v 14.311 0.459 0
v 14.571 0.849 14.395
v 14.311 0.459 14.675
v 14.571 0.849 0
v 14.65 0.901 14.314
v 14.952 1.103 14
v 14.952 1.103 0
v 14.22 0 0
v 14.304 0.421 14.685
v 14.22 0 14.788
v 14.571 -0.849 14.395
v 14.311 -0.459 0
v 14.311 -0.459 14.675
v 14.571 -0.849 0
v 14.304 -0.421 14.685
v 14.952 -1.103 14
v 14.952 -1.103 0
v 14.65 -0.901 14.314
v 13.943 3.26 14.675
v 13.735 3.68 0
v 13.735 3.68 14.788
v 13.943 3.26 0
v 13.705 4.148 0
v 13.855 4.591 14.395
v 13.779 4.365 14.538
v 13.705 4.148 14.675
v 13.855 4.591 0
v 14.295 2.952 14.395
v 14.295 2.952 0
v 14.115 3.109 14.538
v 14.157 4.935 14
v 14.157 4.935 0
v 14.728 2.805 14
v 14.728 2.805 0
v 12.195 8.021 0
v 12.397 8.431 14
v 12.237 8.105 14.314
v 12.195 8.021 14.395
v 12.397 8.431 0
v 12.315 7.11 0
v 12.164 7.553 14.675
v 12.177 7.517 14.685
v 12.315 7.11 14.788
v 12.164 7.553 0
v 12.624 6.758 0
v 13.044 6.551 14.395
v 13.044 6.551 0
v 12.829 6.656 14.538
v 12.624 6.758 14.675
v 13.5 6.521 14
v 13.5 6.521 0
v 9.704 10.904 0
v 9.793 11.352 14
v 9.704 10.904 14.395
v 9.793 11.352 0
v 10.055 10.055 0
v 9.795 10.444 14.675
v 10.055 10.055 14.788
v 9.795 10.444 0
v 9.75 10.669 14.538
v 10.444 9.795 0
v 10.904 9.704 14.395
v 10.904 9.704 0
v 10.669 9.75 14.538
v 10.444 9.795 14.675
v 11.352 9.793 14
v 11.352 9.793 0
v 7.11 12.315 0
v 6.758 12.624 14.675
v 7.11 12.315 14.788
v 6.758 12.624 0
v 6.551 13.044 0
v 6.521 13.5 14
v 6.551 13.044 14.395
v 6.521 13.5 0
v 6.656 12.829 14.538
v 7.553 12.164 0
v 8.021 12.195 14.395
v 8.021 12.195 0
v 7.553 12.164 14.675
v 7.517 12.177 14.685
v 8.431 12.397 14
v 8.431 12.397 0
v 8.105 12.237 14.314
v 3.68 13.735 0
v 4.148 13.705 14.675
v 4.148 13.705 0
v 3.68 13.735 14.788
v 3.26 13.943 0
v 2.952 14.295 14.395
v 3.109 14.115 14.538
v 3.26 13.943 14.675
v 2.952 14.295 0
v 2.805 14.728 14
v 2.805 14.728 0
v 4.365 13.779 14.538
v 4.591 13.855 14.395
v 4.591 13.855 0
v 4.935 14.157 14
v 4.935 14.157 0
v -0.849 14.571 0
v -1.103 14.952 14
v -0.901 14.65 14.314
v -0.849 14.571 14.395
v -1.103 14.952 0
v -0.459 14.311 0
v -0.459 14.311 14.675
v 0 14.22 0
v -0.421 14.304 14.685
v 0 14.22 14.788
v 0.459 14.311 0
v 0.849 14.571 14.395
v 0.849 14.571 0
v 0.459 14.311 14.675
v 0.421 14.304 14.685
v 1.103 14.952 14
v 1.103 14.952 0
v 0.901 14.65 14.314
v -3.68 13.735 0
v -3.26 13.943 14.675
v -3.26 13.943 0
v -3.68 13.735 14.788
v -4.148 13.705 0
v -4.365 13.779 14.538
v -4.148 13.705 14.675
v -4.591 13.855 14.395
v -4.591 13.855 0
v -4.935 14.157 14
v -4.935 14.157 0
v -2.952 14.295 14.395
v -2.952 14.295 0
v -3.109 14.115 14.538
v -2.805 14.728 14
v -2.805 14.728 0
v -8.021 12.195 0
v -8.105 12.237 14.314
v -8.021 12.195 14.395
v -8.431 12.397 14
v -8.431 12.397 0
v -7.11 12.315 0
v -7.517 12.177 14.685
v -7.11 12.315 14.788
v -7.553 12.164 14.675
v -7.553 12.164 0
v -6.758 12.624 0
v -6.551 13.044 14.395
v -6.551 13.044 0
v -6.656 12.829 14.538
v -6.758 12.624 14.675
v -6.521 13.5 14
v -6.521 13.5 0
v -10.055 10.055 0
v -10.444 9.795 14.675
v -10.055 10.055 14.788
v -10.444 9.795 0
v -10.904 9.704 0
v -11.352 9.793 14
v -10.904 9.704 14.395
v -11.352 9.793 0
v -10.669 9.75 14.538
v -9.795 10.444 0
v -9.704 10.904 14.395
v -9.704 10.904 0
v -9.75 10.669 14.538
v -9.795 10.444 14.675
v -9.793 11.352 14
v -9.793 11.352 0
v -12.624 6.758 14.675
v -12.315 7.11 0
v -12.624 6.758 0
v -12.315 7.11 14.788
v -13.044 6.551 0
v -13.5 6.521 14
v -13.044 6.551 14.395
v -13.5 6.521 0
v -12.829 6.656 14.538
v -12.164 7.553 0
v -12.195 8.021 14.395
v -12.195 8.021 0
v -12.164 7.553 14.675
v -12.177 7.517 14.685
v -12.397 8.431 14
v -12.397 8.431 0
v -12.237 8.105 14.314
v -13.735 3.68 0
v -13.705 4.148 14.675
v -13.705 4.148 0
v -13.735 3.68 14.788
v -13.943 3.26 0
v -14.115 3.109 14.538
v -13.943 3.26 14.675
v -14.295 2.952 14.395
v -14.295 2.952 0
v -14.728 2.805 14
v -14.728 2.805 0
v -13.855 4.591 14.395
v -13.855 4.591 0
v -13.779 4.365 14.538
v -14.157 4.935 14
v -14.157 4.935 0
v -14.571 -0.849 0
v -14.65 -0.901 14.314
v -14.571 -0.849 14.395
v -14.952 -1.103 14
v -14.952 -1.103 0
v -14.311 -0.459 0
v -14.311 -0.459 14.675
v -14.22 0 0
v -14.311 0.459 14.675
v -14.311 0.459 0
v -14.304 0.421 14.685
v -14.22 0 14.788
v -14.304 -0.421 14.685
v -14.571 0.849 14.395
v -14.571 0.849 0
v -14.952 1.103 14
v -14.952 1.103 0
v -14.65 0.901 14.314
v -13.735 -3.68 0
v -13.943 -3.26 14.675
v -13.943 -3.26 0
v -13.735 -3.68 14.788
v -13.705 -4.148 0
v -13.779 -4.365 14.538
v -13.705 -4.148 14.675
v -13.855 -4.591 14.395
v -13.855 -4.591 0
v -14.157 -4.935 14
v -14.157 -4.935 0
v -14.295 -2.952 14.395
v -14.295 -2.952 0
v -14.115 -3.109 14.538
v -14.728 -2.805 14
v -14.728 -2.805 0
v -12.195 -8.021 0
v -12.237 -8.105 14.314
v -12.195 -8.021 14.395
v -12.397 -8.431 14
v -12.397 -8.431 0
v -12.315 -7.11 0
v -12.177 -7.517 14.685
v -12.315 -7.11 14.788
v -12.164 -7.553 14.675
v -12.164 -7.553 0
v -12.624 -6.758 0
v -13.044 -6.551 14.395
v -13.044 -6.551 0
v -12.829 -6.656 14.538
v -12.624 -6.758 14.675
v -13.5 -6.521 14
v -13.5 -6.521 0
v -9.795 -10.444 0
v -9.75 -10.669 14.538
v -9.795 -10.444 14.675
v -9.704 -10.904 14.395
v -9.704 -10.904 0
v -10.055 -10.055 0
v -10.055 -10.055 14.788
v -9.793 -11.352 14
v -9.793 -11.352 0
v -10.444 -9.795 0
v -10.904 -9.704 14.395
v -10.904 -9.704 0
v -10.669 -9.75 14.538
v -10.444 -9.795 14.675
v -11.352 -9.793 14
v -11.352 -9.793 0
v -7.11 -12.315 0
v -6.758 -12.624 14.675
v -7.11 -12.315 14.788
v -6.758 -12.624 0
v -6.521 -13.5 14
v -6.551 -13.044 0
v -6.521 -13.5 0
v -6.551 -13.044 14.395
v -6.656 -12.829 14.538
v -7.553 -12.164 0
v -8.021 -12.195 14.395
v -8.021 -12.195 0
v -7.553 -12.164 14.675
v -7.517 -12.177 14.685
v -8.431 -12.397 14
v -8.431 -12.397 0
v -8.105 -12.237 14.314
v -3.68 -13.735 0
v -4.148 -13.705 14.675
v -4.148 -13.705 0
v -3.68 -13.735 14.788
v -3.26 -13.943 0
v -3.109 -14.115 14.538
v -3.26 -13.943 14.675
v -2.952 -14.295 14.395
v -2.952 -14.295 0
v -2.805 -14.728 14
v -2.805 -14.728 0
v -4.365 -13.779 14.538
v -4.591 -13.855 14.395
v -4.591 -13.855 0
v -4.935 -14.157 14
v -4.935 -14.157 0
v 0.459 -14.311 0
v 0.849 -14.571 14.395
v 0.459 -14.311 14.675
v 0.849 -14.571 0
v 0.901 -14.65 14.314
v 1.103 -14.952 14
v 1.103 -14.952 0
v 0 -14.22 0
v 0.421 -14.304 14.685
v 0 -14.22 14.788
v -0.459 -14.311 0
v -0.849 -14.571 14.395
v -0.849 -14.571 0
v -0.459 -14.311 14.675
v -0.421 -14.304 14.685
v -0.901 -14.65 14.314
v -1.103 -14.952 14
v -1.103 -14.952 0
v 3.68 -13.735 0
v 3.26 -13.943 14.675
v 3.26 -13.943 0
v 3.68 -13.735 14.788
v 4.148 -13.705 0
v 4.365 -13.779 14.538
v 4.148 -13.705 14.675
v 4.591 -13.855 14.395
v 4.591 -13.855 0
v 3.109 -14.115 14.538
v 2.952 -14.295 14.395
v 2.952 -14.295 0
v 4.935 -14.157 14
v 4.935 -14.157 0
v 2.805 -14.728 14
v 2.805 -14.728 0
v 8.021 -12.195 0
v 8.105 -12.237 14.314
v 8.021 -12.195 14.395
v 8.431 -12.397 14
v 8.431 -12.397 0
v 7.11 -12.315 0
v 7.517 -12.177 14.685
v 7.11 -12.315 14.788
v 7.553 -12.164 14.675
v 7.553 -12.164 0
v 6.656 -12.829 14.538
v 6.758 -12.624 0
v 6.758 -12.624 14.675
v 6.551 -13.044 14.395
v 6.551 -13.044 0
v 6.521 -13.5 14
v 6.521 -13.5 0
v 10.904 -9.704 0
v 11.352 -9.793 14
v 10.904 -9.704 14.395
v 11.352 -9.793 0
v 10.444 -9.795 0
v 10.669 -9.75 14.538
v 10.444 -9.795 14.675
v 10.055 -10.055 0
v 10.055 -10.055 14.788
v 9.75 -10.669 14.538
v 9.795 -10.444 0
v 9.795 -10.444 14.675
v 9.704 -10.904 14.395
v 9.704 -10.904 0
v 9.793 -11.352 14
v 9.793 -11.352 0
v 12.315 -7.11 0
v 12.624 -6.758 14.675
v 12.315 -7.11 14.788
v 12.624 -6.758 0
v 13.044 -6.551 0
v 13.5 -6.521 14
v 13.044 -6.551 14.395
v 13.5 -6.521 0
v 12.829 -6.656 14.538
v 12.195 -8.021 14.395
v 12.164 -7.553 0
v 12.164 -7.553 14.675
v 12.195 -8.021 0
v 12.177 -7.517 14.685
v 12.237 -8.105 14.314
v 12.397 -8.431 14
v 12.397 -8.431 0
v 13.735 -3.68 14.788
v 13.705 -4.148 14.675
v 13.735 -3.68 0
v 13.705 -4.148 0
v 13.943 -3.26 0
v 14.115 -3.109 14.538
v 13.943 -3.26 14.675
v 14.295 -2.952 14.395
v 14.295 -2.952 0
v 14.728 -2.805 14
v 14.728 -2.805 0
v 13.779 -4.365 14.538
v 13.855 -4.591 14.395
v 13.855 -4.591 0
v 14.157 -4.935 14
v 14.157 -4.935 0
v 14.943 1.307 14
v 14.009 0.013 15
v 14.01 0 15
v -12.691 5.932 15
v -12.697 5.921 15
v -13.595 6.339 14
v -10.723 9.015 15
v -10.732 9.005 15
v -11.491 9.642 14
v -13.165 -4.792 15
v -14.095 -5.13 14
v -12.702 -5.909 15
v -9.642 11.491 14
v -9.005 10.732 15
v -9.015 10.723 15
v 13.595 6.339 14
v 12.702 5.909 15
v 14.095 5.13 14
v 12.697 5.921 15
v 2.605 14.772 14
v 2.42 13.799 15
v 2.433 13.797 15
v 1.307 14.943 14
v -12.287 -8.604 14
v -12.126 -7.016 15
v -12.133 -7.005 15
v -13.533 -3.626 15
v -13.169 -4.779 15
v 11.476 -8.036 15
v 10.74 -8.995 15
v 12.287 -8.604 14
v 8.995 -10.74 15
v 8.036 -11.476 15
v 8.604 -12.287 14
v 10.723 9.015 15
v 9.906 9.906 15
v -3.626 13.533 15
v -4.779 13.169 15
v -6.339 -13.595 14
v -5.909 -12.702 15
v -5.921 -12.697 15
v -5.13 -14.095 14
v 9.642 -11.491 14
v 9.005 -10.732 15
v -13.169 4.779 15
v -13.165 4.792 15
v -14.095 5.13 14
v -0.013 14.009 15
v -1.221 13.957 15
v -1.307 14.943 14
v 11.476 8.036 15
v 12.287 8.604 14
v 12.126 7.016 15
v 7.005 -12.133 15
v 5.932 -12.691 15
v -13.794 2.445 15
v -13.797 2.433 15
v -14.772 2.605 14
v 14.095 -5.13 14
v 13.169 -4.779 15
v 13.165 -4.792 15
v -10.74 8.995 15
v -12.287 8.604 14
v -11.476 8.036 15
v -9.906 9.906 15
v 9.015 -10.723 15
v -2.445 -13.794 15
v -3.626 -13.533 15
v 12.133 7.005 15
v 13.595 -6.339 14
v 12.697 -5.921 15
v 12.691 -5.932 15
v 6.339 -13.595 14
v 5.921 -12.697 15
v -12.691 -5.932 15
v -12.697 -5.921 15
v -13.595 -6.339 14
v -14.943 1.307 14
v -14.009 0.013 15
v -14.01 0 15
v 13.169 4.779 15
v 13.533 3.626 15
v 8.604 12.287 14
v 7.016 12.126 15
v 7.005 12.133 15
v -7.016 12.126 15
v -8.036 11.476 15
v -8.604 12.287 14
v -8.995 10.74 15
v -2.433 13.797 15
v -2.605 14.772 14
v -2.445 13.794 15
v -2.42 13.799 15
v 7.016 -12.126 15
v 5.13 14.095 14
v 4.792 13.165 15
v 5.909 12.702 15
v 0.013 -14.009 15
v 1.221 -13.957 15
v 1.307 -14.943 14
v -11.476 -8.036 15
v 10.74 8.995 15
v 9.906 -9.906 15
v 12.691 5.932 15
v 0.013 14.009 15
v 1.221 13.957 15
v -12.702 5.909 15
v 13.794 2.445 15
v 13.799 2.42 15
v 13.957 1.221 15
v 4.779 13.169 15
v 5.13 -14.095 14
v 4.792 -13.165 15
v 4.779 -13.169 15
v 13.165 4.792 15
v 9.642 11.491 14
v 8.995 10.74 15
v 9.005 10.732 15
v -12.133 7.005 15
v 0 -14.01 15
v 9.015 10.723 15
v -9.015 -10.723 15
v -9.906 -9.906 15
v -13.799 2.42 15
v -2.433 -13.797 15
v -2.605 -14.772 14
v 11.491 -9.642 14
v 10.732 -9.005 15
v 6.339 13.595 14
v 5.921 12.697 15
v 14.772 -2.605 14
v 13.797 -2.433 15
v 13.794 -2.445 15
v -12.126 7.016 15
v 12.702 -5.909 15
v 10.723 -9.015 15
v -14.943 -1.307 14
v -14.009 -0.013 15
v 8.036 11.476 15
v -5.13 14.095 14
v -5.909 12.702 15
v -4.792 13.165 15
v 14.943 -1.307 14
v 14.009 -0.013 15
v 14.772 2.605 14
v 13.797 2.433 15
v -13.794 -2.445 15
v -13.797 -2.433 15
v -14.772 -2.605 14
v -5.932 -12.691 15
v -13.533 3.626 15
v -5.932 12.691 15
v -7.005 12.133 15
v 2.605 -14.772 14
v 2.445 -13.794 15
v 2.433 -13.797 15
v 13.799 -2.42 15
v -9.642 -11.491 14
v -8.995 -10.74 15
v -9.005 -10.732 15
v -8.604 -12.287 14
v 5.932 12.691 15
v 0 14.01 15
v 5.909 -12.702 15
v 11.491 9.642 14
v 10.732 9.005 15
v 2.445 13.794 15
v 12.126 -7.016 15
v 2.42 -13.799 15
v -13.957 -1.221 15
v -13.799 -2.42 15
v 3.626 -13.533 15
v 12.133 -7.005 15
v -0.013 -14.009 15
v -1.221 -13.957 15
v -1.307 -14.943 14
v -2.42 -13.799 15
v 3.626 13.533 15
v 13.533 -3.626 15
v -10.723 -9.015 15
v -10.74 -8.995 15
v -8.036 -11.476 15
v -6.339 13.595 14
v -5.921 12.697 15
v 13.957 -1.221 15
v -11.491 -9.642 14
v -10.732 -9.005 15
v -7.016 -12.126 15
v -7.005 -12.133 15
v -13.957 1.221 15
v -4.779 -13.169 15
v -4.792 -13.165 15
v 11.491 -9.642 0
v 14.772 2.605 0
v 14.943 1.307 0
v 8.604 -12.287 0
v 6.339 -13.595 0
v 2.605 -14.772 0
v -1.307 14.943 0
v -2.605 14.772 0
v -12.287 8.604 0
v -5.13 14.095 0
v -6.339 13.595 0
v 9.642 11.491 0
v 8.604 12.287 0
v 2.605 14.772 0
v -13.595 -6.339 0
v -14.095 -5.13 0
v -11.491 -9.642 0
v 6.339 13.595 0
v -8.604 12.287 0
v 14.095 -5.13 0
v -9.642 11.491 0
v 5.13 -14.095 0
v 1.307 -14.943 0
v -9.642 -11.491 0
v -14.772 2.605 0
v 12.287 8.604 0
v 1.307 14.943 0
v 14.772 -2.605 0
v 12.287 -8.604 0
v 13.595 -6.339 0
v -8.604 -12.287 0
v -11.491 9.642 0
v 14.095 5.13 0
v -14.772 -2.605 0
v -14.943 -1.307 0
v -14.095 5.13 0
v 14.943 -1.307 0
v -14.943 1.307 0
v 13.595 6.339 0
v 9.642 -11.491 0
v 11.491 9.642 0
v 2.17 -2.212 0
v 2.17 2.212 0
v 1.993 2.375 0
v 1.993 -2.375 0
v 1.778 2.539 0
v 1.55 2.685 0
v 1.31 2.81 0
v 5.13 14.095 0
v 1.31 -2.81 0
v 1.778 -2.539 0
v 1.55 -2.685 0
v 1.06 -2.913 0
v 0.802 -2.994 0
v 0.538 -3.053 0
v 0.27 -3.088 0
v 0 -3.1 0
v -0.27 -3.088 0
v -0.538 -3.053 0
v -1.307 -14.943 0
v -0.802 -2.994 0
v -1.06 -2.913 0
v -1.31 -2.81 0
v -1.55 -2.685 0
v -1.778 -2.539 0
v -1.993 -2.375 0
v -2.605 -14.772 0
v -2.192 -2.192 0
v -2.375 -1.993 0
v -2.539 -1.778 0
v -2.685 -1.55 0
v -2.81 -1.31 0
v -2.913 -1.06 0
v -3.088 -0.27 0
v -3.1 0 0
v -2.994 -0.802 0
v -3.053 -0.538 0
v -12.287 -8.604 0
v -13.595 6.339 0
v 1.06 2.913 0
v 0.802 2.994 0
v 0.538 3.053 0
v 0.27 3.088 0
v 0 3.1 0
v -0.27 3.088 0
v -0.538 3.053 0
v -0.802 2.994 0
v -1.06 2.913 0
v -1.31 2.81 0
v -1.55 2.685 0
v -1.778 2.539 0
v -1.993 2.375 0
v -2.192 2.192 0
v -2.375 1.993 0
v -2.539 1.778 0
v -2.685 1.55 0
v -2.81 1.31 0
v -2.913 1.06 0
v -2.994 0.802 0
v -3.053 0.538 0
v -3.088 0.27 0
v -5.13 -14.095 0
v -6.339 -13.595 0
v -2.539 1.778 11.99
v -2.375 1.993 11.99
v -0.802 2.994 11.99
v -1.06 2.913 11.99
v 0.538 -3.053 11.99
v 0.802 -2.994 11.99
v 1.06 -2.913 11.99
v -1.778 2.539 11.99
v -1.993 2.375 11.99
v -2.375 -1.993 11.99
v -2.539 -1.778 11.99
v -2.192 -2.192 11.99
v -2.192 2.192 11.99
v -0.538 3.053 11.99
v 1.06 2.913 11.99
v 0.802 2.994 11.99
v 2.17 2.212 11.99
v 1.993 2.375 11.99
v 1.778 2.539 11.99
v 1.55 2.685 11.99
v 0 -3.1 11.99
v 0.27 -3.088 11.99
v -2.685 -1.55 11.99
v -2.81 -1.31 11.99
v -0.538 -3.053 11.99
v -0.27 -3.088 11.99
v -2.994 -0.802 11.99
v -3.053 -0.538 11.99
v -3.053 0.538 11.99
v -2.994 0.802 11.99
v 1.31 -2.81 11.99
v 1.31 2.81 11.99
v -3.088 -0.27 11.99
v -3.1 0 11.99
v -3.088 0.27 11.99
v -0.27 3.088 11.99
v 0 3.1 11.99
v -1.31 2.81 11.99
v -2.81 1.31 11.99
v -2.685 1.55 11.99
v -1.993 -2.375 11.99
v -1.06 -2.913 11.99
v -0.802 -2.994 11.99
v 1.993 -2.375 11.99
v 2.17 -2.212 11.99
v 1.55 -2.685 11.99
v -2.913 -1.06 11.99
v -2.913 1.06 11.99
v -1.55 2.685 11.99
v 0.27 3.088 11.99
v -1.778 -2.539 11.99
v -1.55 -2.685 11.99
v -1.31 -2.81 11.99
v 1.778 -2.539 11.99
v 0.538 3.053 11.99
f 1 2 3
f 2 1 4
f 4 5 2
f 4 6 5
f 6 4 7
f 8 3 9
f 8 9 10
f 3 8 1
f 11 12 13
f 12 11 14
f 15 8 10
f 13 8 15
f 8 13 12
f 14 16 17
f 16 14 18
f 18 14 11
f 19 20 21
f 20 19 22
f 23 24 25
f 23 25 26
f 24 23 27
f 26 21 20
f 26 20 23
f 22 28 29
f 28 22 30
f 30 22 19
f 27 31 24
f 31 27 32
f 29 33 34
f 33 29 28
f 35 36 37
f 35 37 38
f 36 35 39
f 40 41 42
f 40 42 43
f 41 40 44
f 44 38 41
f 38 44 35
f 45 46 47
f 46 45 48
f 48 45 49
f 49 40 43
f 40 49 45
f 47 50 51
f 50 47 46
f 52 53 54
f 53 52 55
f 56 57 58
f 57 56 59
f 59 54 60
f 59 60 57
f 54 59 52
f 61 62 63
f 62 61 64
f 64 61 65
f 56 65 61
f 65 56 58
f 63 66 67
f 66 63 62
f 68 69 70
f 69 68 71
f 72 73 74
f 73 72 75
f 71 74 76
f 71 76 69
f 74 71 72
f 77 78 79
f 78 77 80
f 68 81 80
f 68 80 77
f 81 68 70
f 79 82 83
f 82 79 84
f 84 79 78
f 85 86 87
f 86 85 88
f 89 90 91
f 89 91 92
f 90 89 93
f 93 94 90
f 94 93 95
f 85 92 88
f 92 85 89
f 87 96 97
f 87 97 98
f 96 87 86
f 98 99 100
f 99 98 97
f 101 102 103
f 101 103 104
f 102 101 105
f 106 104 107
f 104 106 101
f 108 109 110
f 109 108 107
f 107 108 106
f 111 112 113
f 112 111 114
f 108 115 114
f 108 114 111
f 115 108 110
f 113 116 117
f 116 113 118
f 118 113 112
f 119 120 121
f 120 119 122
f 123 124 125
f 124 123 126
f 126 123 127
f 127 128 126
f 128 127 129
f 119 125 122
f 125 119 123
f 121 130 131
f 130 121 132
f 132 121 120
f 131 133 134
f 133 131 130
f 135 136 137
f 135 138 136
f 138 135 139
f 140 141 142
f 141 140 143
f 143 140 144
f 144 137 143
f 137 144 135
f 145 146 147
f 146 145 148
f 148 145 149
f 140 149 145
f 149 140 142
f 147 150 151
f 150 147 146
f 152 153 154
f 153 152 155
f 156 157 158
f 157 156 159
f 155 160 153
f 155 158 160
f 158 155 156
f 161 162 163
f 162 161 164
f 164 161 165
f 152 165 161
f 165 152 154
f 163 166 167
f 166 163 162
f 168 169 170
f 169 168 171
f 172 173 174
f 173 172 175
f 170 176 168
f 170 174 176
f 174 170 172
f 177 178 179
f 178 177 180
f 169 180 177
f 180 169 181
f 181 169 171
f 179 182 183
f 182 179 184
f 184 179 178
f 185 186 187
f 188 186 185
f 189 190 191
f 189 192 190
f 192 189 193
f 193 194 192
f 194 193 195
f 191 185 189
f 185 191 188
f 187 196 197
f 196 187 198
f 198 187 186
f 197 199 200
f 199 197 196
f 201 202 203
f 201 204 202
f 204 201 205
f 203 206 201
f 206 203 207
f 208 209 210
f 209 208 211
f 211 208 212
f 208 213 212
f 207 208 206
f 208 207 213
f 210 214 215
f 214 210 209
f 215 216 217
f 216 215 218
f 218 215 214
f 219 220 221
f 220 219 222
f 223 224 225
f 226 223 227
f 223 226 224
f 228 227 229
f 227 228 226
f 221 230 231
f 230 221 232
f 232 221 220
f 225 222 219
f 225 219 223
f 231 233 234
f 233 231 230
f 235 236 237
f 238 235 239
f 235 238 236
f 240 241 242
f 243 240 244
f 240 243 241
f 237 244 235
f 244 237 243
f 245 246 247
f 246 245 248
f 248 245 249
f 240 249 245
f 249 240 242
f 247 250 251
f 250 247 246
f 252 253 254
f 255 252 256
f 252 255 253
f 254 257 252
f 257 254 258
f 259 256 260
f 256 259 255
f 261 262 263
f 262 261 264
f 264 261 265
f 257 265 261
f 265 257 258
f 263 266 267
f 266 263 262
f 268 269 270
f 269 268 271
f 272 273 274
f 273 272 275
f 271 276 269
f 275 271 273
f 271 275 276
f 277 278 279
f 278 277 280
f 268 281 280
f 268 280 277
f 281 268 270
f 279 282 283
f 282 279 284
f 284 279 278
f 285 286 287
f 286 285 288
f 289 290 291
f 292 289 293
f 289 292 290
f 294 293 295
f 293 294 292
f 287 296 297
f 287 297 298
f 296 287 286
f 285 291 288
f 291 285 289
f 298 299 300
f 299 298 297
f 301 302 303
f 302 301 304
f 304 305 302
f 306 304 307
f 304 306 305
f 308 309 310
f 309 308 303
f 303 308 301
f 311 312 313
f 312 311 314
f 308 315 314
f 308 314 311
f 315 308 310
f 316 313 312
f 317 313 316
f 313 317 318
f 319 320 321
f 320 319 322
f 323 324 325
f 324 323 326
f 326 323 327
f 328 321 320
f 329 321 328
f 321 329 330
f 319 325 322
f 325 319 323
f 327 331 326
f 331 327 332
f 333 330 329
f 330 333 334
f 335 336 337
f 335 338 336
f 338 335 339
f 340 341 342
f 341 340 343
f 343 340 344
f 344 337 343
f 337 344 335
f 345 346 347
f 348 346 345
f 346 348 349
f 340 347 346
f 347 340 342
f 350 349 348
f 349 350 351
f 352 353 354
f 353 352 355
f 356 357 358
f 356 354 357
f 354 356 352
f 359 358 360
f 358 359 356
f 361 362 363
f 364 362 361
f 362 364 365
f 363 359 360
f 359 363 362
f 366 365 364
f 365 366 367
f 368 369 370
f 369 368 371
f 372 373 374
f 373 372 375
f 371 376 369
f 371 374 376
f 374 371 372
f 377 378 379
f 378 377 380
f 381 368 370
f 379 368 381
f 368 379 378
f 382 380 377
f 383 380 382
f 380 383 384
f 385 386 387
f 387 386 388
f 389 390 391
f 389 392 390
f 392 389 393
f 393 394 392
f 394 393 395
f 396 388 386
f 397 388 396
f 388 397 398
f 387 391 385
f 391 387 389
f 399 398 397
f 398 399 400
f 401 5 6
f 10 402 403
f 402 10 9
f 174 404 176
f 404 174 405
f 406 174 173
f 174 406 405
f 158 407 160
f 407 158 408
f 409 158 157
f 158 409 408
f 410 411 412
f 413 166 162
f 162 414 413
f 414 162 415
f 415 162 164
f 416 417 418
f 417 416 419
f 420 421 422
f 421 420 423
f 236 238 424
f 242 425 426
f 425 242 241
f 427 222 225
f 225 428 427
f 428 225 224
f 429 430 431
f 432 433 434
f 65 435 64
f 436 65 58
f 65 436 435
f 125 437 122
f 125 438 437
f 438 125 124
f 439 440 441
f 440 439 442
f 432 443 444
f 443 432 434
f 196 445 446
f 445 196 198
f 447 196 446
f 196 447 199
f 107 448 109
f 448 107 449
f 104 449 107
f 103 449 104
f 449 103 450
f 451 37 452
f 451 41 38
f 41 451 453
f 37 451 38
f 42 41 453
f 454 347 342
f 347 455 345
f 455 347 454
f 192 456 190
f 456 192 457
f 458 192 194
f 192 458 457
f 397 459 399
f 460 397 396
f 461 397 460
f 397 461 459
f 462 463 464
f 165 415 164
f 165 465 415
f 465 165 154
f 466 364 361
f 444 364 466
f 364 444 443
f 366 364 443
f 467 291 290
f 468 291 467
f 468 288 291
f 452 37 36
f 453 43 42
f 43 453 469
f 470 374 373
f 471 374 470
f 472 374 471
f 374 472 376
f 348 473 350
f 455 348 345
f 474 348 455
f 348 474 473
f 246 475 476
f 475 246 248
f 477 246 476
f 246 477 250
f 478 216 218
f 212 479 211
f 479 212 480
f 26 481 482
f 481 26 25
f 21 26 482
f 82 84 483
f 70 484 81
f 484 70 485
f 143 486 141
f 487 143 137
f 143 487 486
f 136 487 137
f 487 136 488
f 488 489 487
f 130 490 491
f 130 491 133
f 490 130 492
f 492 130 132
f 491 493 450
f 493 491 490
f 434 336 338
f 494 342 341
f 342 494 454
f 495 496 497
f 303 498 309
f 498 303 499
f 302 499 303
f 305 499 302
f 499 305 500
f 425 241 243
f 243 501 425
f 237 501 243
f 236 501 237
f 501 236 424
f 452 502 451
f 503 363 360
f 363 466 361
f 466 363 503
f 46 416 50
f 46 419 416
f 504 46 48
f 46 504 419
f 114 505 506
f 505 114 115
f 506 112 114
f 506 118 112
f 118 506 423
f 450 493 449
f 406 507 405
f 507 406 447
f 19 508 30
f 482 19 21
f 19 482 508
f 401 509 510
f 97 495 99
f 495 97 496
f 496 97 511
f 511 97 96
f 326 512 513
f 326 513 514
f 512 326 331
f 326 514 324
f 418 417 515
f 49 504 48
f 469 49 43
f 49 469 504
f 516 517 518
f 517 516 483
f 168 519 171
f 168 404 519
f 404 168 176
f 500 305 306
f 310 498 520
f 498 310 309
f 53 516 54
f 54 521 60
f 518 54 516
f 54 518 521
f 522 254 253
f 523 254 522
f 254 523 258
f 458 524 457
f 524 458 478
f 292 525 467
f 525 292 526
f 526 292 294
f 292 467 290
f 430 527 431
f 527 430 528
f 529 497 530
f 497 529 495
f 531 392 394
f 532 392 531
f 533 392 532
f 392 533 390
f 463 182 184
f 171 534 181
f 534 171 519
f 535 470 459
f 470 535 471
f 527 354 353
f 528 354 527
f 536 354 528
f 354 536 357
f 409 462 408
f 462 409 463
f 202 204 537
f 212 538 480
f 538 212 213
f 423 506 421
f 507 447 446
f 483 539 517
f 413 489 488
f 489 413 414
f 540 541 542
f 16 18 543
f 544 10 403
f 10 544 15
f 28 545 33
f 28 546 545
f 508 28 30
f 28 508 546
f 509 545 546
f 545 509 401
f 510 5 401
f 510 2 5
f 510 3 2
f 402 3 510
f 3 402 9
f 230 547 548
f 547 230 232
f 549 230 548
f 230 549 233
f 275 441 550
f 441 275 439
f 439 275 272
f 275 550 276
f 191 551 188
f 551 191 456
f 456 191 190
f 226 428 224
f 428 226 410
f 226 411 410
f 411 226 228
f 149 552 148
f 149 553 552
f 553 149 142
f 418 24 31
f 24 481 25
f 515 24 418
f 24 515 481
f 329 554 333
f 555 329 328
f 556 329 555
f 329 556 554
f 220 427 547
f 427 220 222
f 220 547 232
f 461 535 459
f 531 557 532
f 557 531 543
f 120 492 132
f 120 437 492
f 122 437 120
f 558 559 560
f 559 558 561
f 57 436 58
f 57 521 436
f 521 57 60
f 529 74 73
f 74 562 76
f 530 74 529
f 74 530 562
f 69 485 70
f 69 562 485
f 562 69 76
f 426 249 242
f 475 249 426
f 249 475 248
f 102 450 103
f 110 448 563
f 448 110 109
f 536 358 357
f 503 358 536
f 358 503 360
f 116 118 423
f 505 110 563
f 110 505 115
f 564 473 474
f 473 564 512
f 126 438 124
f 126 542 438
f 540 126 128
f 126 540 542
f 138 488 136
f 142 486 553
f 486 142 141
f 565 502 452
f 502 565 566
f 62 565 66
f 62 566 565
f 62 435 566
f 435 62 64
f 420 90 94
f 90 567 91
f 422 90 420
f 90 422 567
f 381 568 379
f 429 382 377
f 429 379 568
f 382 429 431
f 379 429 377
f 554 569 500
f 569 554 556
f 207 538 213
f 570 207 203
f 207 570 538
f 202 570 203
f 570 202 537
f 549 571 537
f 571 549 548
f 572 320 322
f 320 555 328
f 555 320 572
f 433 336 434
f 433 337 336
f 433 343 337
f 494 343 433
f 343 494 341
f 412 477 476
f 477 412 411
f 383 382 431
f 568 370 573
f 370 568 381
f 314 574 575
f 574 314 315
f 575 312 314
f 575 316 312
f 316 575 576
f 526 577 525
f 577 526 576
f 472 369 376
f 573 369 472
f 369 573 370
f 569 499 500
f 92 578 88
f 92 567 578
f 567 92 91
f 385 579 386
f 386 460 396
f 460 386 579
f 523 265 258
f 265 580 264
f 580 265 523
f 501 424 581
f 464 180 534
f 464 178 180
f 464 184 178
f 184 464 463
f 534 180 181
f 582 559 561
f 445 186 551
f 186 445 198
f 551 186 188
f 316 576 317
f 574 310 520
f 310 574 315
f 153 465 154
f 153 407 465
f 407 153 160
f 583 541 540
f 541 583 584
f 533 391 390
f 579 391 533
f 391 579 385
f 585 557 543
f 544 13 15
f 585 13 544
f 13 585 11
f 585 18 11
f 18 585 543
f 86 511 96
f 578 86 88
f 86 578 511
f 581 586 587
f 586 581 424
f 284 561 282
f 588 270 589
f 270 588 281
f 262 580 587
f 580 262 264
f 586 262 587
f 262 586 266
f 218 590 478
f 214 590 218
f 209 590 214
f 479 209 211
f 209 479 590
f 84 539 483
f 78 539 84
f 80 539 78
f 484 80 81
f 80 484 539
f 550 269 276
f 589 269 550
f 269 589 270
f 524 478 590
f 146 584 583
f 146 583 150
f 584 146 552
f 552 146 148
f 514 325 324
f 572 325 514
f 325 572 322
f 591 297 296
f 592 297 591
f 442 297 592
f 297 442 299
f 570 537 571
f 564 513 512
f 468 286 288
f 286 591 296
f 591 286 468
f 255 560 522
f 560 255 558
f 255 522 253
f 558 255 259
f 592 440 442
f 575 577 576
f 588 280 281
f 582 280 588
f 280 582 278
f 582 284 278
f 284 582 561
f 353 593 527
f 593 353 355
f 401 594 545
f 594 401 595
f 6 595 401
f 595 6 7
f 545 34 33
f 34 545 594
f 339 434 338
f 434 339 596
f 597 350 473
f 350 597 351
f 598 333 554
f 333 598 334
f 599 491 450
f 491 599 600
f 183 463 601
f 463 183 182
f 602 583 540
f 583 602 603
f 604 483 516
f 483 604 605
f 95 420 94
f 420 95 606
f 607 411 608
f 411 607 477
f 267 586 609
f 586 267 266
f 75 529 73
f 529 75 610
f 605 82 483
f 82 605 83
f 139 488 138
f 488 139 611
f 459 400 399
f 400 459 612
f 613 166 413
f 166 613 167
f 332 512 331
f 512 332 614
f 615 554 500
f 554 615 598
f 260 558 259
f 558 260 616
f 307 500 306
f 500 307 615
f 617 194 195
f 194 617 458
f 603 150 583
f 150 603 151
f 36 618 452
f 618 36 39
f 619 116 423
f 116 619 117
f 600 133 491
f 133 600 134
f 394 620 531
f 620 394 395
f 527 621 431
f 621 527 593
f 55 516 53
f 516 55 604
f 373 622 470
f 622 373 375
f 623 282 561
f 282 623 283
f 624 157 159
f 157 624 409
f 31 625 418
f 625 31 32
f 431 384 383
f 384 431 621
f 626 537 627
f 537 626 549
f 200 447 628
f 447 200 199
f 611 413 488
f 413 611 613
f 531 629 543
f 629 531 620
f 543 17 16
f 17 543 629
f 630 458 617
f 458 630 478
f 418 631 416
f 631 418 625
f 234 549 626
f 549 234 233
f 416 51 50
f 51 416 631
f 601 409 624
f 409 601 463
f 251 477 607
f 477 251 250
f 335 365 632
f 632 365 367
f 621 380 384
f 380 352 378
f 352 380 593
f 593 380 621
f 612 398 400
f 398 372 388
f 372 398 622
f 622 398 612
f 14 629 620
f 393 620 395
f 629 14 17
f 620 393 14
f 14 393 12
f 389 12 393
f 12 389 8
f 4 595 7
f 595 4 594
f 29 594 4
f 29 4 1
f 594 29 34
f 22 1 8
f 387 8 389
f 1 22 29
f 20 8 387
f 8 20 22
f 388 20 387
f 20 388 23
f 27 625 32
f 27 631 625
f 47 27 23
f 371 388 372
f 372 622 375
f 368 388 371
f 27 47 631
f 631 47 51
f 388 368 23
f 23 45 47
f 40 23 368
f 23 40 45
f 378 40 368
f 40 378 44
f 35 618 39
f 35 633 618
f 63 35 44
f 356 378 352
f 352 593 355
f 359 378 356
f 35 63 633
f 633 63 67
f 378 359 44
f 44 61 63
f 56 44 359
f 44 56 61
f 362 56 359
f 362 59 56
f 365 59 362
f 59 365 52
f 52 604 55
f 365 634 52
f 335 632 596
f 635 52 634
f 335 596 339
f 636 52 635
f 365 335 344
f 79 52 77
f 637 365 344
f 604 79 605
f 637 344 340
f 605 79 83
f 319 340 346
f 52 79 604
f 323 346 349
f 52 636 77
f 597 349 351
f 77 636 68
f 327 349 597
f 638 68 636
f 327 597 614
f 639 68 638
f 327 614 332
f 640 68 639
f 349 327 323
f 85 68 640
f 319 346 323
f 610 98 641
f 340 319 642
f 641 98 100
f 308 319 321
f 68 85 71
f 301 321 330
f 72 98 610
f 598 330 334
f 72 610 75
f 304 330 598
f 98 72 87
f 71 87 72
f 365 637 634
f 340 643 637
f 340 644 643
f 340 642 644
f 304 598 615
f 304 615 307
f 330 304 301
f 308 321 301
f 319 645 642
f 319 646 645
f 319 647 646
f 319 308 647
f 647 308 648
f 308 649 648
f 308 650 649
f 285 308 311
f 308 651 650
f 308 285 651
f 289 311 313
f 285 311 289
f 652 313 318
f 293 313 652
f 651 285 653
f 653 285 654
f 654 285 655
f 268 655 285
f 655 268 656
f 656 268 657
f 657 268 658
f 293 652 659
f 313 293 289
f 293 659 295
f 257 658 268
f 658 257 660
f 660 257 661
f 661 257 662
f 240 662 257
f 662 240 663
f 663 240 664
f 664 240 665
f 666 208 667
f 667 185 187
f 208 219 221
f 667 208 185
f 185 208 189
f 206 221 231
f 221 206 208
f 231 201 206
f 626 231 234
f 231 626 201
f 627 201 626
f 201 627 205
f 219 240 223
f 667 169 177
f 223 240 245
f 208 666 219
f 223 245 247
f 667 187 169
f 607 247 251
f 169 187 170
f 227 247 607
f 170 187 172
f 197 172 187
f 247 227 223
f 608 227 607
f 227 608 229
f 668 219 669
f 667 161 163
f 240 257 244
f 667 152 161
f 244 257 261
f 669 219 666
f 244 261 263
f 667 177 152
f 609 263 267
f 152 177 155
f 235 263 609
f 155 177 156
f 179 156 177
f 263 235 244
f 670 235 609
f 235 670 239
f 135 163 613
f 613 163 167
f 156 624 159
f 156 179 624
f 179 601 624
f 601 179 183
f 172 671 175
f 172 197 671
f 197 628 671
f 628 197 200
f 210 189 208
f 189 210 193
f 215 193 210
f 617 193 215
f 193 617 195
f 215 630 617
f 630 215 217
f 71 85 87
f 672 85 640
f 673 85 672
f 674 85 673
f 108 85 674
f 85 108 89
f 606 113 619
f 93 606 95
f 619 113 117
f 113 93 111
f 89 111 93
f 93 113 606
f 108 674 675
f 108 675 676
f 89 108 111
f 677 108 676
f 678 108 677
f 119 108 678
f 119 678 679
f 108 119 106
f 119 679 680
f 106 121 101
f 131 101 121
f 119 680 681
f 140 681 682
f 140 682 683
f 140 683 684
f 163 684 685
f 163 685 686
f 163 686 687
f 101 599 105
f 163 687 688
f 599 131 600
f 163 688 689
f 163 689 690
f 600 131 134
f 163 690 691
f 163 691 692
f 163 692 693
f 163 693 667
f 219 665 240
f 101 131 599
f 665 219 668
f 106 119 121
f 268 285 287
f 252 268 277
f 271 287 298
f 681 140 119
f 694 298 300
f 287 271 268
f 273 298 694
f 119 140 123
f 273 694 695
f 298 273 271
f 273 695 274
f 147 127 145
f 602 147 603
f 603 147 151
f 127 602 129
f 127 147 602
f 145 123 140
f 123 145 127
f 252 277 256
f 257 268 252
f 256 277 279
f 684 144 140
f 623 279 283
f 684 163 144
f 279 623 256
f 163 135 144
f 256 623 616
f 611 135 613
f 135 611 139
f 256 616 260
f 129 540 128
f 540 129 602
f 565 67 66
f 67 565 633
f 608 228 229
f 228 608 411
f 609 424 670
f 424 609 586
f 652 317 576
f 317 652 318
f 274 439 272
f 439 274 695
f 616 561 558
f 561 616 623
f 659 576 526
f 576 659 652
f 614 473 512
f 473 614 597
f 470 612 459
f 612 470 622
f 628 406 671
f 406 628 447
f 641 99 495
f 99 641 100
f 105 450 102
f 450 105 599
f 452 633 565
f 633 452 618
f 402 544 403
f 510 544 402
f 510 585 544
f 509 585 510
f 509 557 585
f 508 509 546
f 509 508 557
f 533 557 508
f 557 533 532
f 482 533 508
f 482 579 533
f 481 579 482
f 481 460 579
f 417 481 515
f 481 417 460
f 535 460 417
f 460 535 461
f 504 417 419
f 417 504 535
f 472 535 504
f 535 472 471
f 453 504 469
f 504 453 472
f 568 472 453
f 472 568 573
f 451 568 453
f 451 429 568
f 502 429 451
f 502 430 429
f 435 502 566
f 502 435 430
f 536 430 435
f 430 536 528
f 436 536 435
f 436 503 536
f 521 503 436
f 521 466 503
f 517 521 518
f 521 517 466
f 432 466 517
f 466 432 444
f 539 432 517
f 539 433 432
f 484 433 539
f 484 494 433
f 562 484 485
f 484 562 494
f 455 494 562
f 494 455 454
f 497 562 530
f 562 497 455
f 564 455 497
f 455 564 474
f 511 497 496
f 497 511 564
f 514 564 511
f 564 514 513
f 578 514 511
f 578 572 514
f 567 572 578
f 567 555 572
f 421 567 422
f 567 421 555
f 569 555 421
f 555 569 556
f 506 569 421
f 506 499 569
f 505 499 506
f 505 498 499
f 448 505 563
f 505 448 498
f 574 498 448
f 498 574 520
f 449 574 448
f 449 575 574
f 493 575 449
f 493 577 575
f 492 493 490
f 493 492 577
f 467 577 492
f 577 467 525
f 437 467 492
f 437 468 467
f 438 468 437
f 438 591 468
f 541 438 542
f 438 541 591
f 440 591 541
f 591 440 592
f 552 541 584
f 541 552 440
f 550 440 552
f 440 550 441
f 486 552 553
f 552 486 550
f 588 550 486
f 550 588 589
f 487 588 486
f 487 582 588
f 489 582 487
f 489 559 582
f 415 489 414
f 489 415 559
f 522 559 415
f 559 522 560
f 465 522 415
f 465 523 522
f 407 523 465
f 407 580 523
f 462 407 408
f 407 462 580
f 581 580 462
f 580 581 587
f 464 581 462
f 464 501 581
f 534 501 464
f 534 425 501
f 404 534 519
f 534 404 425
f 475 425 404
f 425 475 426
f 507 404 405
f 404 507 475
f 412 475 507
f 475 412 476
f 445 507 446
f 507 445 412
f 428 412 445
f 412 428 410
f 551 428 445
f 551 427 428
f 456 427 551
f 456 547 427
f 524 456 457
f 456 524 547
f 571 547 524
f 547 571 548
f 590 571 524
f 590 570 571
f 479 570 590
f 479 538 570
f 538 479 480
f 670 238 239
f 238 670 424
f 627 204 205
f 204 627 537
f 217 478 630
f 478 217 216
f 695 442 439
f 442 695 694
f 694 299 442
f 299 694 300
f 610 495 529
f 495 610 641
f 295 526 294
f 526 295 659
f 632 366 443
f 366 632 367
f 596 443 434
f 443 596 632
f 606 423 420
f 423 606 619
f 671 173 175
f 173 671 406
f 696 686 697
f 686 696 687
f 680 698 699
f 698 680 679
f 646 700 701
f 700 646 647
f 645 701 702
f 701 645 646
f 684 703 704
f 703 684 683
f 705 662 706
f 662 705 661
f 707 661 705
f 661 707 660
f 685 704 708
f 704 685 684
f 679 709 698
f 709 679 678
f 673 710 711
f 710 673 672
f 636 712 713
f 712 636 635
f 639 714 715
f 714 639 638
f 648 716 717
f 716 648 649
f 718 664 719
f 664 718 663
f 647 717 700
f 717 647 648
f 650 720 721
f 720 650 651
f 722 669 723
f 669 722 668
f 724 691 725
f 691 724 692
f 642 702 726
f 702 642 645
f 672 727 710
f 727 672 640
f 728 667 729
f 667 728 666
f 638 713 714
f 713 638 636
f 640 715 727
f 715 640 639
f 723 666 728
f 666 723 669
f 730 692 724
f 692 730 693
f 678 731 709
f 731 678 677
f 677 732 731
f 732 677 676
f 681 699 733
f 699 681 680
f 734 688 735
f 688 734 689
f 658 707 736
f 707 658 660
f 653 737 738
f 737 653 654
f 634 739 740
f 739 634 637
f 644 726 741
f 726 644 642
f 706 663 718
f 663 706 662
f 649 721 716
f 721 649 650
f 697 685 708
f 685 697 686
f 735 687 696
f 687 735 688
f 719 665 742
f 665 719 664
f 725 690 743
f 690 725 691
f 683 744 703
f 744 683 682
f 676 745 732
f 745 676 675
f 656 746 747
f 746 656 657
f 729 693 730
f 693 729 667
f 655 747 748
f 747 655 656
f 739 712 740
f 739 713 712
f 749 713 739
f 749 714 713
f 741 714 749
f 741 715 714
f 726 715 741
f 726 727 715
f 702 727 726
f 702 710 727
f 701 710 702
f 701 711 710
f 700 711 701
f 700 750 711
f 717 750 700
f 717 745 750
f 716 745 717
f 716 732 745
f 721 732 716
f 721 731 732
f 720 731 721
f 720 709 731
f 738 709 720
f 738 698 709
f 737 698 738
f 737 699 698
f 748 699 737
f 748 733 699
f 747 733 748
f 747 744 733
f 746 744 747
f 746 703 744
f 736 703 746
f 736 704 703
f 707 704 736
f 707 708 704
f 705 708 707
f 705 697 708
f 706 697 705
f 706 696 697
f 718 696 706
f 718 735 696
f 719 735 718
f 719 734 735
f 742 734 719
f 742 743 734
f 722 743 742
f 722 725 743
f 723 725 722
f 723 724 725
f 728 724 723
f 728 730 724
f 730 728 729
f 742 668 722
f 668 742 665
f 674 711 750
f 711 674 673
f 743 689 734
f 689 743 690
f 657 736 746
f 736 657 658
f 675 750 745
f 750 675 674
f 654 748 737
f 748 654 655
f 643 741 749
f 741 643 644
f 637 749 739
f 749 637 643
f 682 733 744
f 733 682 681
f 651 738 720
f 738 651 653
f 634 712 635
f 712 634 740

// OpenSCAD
// Knurled knob — Primitive Generator example (Neotko fork)

/* [Knob] */
// Knob diameter
diameter = 30; // [10:80]
// Knob height
height = 15; // [5:40]
// Number of grip ridges
ridges = 24; // [6:60]
// How deep the ridges go
ridge_depth = 1.2; // [0.4:0.1:4]

/* [Shaft] */
// Shaft hole
shaft = "D shaft"; // [D shaft, round, hex]
// Shaft diameter (hex: across flats)
shaft_d = 6.2; // [2:0.1:15]
// Hole depth
shaft_depth = 12; // [3:40]

/* [Hidden] */
$fn = 72;

module grip() {
    difference() {
        cylinder(d = diameter, h = height);
        for (i = [0 : ridges - 1])
            rotate([0, 0, i * 360 / ridges])
                translate([diameter / 2 + ridge_depth * 0.35, 0, -1])
                    cylinder(d = ridge_depth * 2, h = height + 2, $fn = 16);
        // soft top edge
        translate([0, 0, height - 1])
            difference() {
                cylinder(d = diameter + 2, h = 2);
                cylinder(d1 = diameter, d2 = diameter - 2, h = 1.01);
            }
    }
}

module hole() {
    translate([0, 0, -0.01]) {
        if (shaft == "hex")
            cylinder(d = shaft_d / cos(30), h = shaft_depth, $fn = 6);
        else if (shaft == "round")
            cylinder(d = shaft_d, h = shaft_depth);
        else
            difference() {
                cylinder(d = shaft_d, h = shaft_depth);
                translate([shaft_d / 2 - shaft_d * 0.15, -shaft_d, -1]) cube([shaft_d, 2 * shaft_d, shaft_depth + 2]);
            }
    }
}

difference() { grip(); hole(); }
